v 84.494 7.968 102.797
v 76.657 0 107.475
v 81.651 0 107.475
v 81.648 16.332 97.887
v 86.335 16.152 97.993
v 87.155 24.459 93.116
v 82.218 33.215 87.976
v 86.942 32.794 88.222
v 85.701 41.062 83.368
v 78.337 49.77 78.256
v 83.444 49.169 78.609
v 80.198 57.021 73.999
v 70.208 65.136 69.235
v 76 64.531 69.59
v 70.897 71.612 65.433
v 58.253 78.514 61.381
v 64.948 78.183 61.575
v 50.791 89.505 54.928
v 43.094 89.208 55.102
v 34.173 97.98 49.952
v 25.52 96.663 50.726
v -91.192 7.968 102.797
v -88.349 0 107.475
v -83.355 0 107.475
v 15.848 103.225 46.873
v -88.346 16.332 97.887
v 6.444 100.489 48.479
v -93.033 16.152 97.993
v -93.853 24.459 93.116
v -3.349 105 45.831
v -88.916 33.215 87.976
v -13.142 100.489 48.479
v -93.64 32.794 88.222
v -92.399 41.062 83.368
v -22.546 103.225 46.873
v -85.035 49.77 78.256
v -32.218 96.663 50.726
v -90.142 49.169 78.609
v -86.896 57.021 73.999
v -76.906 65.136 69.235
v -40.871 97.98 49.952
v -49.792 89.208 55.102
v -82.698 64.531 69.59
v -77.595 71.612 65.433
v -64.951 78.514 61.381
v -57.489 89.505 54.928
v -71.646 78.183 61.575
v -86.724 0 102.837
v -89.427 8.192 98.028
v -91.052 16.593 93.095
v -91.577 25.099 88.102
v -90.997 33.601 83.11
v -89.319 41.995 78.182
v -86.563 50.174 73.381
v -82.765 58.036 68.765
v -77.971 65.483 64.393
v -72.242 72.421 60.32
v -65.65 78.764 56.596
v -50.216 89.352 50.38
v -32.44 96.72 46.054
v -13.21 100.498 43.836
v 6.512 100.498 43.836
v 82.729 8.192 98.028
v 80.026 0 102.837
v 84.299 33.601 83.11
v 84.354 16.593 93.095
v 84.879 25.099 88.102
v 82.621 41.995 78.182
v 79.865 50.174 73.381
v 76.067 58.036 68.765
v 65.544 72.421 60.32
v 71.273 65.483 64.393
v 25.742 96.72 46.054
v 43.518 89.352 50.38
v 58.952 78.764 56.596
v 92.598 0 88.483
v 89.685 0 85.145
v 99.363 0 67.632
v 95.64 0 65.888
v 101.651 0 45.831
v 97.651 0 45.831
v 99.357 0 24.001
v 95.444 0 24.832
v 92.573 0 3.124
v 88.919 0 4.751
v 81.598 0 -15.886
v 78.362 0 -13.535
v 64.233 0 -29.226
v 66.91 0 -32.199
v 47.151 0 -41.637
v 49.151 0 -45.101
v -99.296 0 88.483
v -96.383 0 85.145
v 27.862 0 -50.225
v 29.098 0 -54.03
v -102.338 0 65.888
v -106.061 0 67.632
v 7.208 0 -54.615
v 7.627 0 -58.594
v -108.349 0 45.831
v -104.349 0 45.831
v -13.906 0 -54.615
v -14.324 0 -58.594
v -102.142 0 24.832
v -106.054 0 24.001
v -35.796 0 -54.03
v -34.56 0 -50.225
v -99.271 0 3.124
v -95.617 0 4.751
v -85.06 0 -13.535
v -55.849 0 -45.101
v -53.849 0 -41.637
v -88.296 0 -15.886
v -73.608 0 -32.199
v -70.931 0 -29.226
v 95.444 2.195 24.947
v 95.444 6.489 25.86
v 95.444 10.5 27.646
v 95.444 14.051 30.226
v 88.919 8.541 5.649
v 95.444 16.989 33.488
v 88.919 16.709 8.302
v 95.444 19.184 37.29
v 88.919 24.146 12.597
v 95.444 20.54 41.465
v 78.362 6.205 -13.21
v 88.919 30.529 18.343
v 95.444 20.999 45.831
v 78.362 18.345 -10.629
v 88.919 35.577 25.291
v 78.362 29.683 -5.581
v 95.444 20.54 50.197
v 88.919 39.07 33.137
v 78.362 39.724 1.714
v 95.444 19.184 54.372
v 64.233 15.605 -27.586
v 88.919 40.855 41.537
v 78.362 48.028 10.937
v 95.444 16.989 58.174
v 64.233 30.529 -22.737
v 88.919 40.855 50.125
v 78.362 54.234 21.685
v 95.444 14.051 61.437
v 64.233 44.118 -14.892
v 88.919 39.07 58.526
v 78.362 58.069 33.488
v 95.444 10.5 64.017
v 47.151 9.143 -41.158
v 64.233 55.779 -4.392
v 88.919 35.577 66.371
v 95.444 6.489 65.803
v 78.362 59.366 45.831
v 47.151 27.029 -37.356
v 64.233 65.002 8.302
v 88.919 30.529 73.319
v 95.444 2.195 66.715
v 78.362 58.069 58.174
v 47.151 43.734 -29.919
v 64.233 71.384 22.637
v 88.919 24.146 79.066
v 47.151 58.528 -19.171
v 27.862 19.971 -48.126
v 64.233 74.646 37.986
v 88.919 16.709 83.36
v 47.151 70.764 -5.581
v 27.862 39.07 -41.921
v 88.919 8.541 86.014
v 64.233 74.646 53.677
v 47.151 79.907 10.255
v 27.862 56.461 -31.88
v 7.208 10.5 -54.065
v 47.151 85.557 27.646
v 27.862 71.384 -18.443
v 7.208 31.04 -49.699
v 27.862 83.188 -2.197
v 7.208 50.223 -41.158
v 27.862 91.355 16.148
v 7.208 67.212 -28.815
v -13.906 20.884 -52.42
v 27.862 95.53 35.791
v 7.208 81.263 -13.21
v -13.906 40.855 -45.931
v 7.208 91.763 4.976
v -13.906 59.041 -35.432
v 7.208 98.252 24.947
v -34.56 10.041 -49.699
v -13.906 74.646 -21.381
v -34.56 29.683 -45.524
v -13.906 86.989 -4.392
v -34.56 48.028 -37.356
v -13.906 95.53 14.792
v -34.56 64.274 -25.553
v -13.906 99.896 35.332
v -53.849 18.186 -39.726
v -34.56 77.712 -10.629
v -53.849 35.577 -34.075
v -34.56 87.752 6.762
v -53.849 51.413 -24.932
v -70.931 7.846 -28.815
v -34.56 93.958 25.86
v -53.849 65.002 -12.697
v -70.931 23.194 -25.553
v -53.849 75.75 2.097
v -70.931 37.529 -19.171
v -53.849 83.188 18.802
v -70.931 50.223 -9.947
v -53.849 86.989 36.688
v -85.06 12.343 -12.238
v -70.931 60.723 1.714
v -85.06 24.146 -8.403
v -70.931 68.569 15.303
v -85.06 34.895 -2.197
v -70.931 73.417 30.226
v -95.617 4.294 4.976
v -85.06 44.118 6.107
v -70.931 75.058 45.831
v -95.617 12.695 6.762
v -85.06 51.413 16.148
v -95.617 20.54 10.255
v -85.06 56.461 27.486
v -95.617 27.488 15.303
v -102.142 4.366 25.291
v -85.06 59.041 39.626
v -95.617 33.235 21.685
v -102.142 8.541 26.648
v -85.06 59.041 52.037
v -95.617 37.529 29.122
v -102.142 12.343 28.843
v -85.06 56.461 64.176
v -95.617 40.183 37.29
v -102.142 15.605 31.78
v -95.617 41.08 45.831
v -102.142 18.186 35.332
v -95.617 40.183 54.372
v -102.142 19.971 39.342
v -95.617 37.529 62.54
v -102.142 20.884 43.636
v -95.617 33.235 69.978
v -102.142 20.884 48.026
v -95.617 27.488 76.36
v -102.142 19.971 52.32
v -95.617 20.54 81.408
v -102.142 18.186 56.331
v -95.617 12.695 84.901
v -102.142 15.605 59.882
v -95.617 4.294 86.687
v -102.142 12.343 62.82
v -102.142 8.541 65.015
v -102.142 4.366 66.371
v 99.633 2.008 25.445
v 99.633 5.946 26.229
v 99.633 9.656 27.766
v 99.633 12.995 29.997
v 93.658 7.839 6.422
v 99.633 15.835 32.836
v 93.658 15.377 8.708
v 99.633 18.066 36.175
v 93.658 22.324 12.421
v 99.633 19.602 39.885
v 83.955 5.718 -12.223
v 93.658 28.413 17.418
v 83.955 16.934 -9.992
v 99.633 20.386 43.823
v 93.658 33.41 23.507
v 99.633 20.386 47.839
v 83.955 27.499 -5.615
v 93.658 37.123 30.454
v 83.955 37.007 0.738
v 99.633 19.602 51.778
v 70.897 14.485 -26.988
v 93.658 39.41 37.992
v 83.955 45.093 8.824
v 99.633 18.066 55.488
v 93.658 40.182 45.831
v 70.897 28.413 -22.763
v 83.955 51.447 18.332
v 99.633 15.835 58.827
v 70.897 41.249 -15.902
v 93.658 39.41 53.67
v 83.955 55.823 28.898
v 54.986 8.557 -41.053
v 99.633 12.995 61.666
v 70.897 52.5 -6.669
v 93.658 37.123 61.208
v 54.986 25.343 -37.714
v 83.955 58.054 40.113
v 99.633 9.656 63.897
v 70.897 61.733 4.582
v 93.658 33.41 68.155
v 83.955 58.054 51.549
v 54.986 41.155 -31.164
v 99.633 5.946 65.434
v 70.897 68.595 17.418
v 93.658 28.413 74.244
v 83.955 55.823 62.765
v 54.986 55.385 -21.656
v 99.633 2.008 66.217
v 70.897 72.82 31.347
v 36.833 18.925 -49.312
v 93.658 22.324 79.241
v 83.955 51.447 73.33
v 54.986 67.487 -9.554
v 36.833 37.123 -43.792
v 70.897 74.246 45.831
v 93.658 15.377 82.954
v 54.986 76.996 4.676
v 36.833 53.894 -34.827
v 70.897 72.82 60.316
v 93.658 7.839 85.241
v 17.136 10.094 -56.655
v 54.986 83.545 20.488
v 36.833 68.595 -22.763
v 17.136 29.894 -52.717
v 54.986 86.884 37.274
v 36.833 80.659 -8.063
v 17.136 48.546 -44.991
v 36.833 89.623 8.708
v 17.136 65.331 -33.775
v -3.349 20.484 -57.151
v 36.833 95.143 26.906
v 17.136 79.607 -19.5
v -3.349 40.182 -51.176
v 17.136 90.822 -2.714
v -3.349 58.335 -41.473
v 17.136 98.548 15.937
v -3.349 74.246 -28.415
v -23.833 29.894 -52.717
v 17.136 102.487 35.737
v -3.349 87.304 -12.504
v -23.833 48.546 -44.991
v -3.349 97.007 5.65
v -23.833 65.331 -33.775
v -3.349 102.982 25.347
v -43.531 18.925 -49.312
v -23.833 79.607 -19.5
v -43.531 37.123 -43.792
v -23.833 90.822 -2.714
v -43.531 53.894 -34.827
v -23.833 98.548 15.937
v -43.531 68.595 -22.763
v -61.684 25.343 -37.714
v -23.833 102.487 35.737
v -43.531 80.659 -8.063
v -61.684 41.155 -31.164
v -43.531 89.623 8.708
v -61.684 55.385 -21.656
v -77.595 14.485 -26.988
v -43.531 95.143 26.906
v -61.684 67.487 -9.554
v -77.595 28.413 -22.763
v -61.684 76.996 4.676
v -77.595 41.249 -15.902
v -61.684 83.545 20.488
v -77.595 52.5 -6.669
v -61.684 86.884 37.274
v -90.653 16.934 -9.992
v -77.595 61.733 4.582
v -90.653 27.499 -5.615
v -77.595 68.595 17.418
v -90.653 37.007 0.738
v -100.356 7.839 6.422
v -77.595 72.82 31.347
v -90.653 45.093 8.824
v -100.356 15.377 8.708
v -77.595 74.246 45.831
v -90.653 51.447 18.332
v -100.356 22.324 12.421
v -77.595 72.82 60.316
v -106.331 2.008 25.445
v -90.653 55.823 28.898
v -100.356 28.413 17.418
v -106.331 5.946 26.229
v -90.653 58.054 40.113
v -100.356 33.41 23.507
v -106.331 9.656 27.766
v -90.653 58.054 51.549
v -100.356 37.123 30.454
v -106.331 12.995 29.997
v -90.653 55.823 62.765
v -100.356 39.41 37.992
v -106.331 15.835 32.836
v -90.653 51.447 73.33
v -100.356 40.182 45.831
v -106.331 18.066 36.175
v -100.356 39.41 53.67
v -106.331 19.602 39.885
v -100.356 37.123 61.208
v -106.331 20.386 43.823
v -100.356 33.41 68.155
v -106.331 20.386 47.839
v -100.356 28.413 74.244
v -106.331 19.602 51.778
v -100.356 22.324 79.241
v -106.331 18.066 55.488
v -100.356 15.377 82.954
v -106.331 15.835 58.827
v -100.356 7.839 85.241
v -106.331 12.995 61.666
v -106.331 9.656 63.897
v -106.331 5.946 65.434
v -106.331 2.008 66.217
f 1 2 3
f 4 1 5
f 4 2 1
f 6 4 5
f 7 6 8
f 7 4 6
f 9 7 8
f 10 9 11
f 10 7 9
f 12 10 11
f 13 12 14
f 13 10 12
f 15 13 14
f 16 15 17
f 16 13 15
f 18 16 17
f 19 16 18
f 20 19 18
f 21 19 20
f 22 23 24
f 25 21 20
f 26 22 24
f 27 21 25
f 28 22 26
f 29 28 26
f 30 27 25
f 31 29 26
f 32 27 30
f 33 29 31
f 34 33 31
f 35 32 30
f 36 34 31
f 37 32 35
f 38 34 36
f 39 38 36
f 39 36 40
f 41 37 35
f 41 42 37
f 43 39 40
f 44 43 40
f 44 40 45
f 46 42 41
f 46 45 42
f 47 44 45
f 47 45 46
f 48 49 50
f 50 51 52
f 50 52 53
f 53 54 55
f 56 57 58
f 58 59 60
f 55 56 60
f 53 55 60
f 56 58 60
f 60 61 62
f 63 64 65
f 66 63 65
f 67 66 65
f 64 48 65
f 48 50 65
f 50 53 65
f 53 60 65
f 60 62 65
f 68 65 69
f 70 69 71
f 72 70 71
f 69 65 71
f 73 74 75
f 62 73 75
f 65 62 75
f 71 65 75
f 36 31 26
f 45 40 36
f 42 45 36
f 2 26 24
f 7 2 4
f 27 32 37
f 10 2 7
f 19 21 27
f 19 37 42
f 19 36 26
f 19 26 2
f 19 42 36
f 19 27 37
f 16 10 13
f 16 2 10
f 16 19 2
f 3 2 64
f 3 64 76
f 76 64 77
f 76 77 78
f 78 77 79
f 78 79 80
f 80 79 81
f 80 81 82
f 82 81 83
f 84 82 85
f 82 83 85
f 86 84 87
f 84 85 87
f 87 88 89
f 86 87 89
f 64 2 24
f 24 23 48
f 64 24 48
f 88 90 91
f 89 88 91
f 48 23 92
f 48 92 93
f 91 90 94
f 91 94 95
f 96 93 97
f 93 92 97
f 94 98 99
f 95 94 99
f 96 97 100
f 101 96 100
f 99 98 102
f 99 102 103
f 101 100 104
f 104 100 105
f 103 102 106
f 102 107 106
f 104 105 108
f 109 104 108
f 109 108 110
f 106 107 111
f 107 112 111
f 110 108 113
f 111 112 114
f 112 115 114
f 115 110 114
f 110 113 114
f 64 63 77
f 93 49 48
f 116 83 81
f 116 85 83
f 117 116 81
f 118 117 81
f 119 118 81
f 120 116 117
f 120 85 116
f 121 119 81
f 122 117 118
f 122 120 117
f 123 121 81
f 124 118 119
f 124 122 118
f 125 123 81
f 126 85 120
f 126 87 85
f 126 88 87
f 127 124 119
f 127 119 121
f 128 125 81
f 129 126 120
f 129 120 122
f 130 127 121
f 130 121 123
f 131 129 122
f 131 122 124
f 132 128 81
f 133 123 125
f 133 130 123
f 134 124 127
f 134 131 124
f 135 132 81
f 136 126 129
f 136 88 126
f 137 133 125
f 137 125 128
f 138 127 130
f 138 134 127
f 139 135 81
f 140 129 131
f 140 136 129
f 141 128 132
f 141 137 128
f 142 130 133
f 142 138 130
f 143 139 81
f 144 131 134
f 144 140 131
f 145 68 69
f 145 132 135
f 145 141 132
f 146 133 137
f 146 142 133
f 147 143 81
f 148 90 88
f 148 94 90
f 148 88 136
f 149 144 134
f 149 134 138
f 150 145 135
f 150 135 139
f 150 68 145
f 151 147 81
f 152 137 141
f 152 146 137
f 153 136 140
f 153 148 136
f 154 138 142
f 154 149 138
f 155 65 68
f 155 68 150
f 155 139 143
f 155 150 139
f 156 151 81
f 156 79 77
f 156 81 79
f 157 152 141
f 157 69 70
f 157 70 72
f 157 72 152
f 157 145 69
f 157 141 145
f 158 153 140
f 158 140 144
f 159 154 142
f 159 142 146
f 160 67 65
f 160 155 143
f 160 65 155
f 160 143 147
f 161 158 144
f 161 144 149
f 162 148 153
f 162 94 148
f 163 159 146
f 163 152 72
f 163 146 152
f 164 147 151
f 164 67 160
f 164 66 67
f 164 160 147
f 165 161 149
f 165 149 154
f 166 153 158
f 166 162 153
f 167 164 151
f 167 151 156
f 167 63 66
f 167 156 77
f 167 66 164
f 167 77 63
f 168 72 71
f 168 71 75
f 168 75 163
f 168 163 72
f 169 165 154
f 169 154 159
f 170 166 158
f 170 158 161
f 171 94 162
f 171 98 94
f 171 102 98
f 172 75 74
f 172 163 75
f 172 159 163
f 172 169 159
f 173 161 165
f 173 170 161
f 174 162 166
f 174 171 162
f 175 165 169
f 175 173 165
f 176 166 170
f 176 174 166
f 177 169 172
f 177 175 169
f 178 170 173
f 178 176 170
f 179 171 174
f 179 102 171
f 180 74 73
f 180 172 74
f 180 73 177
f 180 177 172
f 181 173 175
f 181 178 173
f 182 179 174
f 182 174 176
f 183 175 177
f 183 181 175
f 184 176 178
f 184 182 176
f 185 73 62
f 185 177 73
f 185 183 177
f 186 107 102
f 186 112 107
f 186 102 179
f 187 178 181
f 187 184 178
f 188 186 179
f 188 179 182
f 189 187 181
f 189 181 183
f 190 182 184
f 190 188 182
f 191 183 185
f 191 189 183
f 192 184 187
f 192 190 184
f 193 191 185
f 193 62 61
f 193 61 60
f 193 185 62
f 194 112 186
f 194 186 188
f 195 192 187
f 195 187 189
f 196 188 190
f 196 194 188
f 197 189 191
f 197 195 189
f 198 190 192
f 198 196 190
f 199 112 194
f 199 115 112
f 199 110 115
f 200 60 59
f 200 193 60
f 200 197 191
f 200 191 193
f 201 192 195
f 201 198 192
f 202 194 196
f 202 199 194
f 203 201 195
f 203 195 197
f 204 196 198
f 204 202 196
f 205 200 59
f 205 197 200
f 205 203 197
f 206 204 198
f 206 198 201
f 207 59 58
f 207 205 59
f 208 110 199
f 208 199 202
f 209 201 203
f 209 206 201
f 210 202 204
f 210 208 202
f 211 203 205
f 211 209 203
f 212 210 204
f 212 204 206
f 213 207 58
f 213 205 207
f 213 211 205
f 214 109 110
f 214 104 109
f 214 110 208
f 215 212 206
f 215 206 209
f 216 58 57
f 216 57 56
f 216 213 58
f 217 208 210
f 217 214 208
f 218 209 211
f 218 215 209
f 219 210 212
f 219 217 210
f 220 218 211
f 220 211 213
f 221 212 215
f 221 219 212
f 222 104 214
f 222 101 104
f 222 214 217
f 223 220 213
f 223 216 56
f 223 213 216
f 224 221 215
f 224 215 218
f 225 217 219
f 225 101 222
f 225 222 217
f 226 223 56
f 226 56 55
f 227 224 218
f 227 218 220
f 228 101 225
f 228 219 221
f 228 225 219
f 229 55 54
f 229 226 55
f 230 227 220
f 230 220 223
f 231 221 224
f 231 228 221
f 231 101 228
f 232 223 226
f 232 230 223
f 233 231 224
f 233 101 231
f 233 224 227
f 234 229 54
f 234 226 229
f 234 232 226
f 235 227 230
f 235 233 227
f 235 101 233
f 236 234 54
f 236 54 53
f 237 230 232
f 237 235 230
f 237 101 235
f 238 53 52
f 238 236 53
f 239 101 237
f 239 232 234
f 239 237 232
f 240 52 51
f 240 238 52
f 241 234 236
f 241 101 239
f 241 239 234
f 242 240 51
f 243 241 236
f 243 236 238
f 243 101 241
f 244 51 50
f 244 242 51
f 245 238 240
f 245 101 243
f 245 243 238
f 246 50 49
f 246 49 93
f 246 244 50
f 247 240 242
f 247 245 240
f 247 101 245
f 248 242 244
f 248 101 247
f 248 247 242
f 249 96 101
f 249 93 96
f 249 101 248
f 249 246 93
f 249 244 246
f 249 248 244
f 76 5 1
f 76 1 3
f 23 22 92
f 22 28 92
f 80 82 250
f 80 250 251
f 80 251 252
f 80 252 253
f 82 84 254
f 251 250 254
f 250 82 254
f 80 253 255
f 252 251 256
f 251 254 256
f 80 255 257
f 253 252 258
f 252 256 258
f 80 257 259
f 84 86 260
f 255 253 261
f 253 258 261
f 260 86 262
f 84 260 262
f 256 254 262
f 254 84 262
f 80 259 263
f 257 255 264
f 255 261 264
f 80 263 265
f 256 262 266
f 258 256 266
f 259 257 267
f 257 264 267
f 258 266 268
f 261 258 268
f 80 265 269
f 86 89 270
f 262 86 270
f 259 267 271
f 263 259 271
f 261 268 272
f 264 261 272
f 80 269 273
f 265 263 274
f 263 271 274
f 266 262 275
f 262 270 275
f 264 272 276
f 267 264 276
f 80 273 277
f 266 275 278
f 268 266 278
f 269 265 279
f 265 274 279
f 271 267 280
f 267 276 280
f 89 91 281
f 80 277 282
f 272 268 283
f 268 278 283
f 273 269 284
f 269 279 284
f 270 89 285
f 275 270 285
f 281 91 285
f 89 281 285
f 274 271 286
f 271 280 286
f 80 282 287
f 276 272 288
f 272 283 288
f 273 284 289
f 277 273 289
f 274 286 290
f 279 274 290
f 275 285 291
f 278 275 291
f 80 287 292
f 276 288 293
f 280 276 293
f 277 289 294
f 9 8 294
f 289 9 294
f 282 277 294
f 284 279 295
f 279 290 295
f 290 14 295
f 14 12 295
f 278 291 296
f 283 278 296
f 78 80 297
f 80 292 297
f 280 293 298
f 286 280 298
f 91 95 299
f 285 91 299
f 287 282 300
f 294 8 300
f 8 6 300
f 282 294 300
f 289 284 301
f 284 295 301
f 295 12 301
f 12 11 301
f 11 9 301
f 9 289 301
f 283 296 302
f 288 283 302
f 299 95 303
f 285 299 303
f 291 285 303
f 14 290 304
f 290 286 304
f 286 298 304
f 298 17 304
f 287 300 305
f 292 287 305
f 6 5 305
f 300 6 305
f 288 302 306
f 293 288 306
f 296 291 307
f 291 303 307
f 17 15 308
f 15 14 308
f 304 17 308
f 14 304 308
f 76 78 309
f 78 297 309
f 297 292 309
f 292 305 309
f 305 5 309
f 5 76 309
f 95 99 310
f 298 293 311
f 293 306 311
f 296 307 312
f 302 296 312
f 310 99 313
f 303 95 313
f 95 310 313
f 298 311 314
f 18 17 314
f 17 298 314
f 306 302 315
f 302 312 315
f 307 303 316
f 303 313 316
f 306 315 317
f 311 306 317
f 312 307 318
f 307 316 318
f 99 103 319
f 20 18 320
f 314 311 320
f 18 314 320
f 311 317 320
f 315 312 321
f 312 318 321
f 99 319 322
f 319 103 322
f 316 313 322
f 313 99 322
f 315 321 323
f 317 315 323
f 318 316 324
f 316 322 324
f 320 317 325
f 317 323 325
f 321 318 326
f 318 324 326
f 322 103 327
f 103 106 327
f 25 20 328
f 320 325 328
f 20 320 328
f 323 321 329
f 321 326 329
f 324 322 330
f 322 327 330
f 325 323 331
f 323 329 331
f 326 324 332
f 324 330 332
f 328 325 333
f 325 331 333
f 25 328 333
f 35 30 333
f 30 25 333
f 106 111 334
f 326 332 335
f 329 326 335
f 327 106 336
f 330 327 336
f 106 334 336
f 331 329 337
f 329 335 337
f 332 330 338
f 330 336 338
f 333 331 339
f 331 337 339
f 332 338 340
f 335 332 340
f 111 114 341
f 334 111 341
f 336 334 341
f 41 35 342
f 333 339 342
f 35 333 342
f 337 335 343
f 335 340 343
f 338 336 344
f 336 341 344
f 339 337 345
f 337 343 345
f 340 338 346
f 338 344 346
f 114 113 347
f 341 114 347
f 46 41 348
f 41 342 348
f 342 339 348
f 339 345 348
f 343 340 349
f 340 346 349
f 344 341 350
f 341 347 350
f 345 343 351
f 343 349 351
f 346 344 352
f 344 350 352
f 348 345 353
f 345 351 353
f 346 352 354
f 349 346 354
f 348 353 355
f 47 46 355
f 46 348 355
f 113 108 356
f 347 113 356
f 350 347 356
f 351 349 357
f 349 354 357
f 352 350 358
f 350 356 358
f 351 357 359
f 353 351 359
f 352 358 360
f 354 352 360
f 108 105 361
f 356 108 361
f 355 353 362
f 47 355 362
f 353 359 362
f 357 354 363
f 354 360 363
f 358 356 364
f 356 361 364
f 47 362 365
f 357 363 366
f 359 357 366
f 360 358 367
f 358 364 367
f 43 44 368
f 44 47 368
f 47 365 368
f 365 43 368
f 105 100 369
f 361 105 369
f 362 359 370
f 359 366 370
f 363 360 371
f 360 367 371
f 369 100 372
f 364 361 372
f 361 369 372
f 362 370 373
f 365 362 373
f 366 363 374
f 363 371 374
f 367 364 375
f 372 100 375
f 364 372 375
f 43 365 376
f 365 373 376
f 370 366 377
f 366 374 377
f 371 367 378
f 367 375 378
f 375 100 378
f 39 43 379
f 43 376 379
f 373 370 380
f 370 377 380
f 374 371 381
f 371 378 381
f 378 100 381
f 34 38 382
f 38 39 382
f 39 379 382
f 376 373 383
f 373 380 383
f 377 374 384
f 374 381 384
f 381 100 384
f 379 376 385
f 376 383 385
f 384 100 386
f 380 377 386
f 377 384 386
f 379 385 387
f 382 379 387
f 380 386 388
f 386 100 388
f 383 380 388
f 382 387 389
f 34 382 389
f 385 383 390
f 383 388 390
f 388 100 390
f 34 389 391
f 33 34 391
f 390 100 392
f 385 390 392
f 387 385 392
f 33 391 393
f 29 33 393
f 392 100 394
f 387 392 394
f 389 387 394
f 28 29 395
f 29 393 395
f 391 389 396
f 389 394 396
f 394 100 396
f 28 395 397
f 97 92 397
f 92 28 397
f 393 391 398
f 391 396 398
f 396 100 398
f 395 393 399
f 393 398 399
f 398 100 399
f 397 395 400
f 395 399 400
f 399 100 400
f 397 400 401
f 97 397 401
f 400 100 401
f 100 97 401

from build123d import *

# Parameters (mm, degrees)
R_VOLUTION1_ANGLE            = 180
COQUE4_T                     = -4
ENL_V_MAT_EXTRU_4_DEPTH      = 215
ENL_V_MAT_EXTRU_4_DEPTH_BACK = 215
BOSS_EXTRU_2_DEPTH           = 4
ENL_V_MAT_EXTRU_5_DEPTH      = 116
ENL_V_MAT_EXTRU_5_DEPTH_BACK = 116


with BuildPart() as part:
    # Esquisse3 → Révolution1 (revolve)
    with BuildSketch(Plane(origin=(0, 0, 0), x_dir=(1, 0, 0), z_dir=(0, 1, 0))):
        with BuildLine():
            Line((-99.218538531, -45.831289244), (92.520591904, -45.831289244))
            Line((92.520591904, -45.831289244), (101.651026687, -45.831289244))
            ThreePointArc((101.651026687, -45.831289244), (-3.348973313, 59.168710756), (-108.348973313, -45.831289244))
            Line((-108.348973313, -45.831289244), (-99.218538531, -45.831289244))
        make_face()
    revolve(axis=Axis((-99.218538531, 0, 45.831289244), (1, 0, 0)), revolution_arc=R_VOLUTION1_ANGLE)

    # Coque4
    coque4_openings = [part.faces().sort_by_distance(p)[0] for p in [
        (-3.348973313, 0, 45.831289244),
    ]]
    offset(amount=COQUE4_T, openings=coque4_openings)

    # Esquisse8 → Enlèv. mat.-Extru.4 (cut, two sides: drawn at the far end of the back side and taken through both)
    with BuildSketch(Plane(origin=(60.188697083, -79.696891645, -906.524570727), x_dir=(0, 0, -1), z_dir=(1, 0, 0)).offset(-ENL_V_MAT_EXTRU_4_DEPTH_BACK)):
        Polygon((-1014, 79.696891645), (-952.35585997, 184.696891645), (-1018.029052905, 190.459065972), (-1080.678095687, 148.38135067), (-1080.678095687, 69.088233835), align=None)
    extrude(amount=ENL_V_MAT_EXTRU_4_DEPTH + ENL_V_MAT_EXTRU_4_DEPTH_BACK, mode=Mode.SUBTRACT)

    # Esquisse9 → Boss.-Extru.2 (add)
    with BuildSketch(Plane(origin=(0, 46.924060253, 79.926921264), x_dir=(1, 0, 0), z_dir=(0, 0.5062842851630452, 0.8623666404708291))):
        with BuildLine():
            Line((-88.348973313, -54.413120882), (81.651026687, -54.413120882))
            ThreePointArc((81.651026687, -54.413120882), (-3.348973313, 67.344835737), (-88.348973313, -54.413120882))
        make_face()
    extrude(amount=-BOSS_EXTRU_2_DEPTH)

    # Esquisse12 → Enlèv. mat.-Extru.5 (cut, two sides: drawn at the far end of the back side and taken through both)
    with BuildSketch(Plane(origin=(0, 0, 0), x_dir=(0, 0, -1), z_dir=(1, 0, 0)).offset(-ENL_V_MAT_EXTRU_5_DEPTH_BACK)):
        Polygon((-107.475429273, 0), (-102.191678846, 0), (-103.675762979, -3.693901999), align=None)
    extrude(amount=ENL_V_MAT_EXTRU_5_DEPTH + ENL_V_MAT_EXTRU_5_DEPTH_BACK, mode=Mode.SUBTRACT)


solid = part.part
